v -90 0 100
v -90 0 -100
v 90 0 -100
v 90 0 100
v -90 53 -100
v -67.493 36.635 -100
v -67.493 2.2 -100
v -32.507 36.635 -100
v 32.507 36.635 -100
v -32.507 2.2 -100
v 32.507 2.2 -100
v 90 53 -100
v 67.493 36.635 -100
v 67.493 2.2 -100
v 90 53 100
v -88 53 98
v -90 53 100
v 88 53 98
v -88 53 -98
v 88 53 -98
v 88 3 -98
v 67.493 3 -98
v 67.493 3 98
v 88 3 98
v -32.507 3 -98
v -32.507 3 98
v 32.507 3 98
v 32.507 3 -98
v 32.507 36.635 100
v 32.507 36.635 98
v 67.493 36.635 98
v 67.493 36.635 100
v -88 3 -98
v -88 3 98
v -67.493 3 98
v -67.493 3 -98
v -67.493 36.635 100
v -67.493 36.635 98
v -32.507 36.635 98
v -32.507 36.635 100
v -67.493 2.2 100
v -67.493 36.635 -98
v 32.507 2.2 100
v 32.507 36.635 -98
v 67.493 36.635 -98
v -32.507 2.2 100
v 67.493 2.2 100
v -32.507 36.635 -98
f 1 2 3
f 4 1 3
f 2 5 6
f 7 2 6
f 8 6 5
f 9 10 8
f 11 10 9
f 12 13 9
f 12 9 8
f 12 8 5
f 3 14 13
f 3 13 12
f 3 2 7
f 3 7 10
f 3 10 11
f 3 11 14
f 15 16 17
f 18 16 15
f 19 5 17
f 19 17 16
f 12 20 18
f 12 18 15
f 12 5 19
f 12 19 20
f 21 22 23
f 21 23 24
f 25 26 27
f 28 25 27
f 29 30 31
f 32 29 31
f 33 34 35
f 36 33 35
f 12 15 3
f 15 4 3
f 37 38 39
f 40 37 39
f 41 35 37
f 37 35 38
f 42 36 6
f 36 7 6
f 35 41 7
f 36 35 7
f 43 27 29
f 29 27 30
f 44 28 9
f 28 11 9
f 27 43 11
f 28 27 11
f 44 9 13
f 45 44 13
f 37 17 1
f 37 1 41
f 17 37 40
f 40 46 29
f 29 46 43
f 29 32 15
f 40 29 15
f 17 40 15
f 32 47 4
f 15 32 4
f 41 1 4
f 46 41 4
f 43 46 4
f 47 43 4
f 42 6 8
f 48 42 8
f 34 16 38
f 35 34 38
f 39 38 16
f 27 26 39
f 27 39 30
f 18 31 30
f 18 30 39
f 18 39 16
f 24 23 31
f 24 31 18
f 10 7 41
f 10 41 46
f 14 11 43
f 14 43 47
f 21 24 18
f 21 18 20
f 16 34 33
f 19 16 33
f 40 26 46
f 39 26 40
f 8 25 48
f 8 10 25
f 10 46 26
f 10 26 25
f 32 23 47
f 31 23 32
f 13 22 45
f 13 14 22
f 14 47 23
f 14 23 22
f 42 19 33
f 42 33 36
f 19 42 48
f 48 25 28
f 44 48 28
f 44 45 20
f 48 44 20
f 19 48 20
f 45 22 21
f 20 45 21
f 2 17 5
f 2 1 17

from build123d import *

# Parameters (mm, degrees)
SKETCH1_W               = 180
SKETCH1_H               = 200
BOSS_EXTRUDE1_DEPTH     = 3
SKETCH2_W               = 180
SKETCH2_H               = 200
SKETCH2_W_2             = 176
SKETCH2_H_2             = 196
BOSS_EXTRUDE2_DEPTH     = 50
CUT_EXTRUDE1_DEPTH      = 145.599446749
CUT_EXTRUDE1_DEPTH_BACK = 145.599446749
SKETCH3_W               = 34.985098544
SKETCH3_H               = 34.434974118


with BuildPart() as part:
    # Sketch1 → Boss-Extrude1 (new body)
    with BuildSketch(Plane(origin=(0, 0, 0), x_dir=(1, 0, 0), z_dir=(0, 1, 0))):
        Rectangle(SKETCH1_W, SKETCH1_H)
    extrude(amount=BOSS_EXTRUDE1_DEPTH)

    # Sketch2 → Boss-Extrude2 (add)
    with BuildSketch(Plane(origin=(0, 3, 0), x_dir=(1, 0, 0), z_dir=(0, 1, 0))):
        Rectangle(SKETCH2_W, SKETCH2_H)
        Rectangle(SKETCH2_W_2, SKETCH2_H_2, mode=Mode.SUBTRACT)
    extrude(amount=BOSS_EXTRUDE2_DEPTH)

    # Sketch3 → Cut-Extrude1 (cut, two sides: drawn at the far end of the back side and taken through both)
    with BuildSketch(Plane.XY.offset(-CUT_EXTRUDE1_DEPTH_BACK)):
        with Locations((-50, 19.417487059)):
            Rectangle(SKETCH3_W, SKETCH3_H)
        with Locations((50, 19.417487059)):
            Rectangle(SKETCH3_W, SKETCH3_H)
    extrude(amount=CUT_EXTRUDE1_DEPTH + CUT_EXTRUDE1_DEPTH_BACK, mode=Mode.SUBTRACT)


solid = part.part
